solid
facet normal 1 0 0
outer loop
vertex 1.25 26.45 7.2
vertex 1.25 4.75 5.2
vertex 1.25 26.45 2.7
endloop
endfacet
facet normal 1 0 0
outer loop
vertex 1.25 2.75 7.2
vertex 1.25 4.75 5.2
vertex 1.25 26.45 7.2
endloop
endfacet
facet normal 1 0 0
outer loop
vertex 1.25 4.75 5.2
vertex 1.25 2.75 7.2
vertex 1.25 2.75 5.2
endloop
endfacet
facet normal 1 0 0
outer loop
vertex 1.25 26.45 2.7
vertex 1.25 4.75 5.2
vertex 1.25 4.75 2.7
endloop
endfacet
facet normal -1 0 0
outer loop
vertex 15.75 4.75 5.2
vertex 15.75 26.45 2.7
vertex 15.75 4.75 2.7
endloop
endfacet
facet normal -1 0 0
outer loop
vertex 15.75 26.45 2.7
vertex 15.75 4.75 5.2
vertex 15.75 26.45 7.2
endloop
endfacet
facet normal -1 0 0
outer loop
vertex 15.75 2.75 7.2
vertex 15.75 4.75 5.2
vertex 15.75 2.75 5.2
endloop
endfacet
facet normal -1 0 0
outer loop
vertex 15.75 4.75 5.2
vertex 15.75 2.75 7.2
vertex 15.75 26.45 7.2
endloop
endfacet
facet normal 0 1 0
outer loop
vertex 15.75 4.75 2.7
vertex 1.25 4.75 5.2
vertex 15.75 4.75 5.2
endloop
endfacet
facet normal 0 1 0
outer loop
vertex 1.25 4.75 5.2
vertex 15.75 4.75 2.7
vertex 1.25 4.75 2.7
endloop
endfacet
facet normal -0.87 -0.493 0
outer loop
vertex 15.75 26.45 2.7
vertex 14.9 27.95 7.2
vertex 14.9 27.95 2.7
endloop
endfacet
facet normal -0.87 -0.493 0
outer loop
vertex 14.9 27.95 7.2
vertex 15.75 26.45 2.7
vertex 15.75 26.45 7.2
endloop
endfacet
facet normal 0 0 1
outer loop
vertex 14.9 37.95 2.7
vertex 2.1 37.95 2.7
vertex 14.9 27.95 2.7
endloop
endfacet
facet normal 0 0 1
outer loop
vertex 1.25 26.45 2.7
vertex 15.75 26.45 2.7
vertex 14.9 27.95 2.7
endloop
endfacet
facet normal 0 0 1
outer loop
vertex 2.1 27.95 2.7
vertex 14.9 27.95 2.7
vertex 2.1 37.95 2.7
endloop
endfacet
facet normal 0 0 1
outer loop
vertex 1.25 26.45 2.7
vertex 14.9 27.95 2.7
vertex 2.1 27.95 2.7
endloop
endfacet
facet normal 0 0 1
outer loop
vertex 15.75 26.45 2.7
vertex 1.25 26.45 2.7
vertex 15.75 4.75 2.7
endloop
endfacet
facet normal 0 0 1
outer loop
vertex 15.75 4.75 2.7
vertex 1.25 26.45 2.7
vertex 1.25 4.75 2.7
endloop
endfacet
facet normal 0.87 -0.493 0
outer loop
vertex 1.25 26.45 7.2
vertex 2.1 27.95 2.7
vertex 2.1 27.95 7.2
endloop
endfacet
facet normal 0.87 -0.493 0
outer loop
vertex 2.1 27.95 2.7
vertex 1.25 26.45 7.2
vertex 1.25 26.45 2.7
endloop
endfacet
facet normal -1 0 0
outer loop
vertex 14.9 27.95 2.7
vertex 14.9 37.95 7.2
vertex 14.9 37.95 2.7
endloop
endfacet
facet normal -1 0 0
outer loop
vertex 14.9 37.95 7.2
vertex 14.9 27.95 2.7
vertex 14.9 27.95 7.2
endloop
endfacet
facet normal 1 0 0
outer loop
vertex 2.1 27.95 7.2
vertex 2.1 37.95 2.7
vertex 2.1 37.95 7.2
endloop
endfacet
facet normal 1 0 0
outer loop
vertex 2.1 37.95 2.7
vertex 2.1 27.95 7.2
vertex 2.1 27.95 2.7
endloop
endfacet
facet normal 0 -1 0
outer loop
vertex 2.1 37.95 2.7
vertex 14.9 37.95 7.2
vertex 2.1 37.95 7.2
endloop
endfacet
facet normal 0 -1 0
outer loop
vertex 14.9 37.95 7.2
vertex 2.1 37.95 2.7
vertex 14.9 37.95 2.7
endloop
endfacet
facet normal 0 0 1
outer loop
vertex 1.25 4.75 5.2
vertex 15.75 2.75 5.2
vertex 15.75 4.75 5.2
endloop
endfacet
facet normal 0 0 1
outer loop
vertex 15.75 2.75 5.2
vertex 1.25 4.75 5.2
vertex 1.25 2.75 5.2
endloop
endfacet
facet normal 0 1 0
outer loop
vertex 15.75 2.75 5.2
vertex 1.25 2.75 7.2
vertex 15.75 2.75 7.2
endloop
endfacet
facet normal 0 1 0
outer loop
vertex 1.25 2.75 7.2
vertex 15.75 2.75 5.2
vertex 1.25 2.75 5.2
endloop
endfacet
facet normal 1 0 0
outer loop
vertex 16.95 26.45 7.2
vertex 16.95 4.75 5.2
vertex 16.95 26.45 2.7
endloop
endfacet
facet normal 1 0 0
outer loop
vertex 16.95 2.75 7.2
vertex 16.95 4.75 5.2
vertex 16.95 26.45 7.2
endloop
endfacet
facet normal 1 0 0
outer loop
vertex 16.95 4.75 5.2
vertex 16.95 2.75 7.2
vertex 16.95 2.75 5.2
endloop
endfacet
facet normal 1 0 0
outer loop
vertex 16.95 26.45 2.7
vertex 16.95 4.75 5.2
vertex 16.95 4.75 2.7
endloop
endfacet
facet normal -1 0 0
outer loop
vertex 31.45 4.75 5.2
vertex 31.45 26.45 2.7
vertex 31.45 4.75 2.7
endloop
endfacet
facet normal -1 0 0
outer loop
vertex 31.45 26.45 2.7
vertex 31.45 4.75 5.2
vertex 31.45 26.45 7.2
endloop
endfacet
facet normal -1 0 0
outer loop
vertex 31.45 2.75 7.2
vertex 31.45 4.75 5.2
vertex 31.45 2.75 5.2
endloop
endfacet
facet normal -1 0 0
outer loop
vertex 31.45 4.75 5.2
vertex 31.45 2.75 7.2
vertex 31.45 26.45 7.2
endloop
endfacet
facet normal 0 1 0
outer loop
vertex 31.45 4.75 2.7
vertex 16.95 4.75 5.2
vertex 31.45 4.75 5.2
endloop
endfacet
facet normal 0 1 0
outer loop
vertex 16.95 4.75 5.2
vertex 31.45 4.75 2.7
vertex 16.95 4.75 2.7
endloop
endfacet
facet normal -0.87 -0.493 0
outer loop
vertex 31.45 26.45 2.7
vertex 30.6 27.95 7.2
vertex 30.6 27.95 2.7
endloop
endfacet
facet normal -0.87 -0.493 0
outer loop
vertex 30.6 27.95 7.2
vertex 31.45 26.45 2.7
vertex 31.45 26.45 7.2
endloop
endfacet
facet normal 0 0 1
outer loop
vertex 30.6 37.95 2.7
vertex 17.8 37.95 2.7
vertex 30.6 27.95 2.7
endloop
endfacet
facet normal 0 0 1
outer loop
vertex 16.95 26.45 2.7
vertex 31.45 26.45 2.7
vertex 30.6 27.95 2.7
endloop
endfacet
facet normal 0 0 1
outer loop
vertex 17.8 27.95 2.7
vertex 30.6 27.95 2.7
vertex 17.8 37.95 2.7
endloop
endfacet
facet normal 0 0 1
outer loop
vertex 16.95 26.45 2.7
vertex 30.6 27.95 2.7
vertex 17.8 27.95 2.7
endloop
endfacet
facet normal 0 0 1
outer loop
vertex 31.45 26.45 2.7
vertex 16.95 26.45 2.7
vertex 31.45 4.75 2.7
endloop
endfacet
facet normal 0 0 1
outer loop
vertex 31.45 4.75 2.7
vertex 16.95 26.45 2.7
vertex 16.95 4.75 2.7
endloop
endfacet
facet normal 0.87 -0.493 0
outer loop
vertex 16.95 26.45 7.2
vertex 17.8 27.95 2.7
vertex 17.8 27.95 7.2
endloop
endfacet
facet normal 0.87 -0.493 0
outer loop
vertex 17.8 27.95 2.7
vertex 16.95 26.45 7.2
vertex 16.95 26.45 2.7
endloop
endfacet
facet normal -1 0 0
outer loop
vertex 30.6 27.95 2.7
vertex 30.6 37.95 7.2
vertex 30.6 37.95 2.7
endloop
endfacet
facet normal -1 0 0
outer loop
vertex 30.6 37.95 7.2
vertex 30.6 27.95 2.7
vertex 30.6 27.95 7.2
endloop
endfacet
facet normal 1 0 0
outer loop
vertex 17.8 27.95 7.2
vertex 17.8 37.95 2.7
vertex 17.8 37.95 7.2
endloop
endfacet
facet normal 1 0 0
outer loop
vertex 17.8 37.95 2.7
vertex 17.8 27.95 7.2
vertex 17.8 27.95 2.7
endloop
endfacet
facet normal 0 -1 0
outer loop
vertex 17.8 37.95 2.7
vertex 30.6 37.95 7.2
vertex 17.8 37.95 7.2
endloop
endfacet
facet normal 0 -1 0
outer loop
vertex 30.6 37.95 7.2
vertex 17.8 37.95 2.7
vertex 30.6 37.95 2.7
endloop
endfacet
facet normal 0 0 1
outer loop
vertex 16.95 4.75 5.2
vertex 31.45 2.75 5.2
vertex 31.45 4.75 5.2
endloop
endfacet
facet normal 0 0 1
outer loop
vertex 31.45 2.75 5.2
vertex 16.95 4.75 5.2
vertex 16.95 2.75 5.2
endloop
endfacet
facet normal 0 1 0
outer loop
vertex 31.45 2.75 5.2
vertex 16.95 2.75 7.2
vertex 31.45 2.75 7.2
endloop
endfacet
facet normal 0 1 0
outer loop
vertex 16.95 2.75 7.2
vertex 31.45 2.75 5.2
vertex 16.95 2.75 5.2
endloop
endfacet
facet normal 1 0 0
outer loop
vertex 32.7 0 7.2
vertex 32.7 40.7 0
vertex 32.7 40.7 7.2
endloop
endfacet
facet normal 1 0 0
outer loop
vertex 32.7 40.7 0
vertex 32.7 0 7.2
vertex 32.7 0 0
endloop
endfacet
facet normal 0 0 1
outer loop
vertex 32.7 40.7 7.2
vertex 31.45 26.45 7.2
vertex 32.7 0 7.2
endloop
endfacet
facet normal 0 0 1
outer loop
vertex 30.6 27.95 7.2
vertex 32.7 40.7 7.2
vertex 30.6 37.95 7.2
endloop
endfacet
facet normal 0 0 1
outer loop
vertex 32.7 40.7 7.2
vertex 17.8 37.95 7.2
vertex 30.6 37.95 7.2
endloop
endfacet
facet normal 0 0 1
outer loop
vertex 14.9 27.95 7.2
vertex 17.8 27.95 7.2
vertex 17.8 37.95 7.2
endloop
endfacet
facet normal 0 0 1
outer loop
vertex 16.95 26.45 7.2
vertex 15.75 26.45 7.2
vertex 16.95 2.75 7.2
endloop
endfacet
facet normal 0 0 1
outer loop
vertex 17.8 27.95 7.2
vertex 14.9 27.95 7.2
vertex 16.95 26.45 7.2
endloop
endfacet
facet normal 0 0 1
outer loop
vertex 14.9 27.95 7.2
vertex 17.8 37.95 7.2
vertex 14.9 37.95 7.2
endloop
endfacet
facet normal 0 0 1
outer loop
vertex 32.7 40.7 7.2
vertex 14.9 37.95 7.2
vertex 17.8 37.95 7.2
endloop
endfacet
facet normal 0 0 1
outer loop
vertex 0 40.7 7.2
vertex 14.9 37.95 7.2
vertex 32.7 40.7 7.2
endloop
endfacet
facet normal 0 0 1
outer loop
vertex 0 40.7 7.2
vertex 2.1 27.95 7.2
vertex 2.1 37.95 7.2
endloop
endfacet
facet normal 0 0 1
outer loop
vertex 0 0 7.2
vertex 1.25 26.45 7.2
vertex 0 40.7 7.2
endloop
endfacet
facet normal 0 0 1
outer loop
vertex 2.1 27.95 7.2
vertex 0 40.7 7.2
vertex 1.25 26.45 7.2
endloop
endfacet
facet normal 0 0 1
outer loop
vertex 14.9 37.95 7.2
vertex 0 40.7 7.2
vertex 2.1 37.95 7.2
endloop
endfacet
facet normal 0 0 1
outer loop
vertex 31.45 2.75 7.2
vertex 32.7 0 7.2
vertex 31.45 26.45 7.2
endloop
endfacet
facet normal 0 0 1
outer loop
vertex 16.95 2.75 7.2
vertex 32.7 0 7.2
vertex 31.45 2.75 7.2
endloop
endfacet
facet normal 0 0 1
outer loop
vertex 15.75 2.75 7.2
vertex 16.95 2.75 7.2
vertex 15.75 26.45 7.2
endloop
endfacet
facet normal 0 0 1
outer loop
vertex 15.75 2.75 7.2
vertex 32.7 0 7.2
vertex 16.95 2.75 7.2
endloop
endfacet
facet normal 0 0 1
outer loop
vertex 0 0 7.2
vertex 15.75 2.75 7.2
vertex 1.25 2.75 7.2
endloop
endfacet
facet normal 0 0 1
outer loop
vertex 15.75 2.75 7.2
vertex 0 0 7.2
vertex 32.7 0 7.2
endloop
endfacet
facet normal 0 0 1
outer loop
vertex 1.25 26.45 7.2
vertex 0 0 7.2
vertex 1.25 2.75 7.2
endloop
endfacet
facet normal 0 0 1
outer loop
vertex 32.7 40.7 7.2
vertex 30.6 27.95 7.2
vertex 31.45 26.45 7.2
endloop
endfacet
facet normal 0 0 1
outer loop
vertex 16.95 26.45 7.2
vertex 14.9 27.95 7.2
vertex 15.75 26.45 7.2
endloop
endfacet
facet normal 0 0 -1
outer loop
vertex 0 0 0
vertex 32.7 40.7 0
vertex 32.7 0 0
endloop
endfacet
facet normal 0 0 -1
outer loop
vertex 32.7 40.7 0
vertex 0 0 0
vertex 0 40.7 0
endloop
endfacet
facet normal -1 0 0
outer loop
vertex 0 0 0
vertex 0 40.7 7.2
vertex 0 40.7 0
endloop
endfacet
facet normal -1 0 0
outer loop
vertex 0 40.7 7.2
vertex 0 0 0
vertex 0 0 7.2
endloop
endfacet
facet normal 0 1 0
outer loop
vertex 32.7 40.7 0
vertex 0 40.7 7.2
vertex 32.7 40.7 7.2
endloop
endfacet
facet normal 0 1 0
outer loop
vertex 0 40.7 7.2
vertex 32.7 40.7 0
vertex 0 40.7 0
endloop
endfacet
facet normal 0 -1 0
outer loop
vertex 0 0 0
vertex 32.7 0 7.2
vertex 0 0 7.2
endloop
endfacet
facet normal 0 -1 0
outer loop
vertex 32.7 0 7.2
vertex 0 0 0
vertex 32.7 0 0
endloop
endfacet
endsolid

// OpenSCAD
/* [Case] */

//Case outer width
case_width = 34.5;

//Case outer lenth
case_lenth = 42.5;

//Case outer height
case_height = 9;

//Case thickness
case_thickness = 0.9;

//Space between the USB keys
spacing_x = 1.2;

/* [USB] */

//USB total lenth
USB_lenth = 33.2;

//USB back part width
USB_back_width = 14.5;

/* [Hidden] */
USB_front_width = 12+0.8;
USB_front_lenth = 10;
USB_height = 4.5;
lever_height = 2;
lever_depth = 2;
inside_width = case_width - (case_thickness * 2);
inside_lenth = case_lenth - (case_thickness * 2);
inside_height = case_height - (case_thickness * 2);
spacing_y = (inside_lenth-USB_lenth+lever_depth)/2;
USB_slots = floor(inside_width/(USB_back_width+spacing_x));
side_spacing = (inside_width-(spacing_x+(USB_back_width+spacing_x)*USB_slots))/2;
USB_back_lenth = USB_lenth-USB_front_lenth-1.5;

module case() {
    cube([inside_width, inside_lenth, inside_height]);
}

module USB() {
	hull() {
		cube([USB_back_width, USB_back_lenth, USB_height]);	
		translate([((USB_back_width-USB_front_width)/2),USB_back_lenth,0]) {
			cube([USB_front_width, 1.5, USB_height]);
		}
	}
	translate([((USB_back_width-USB_front_width)/2),USB_back_lenth+1.5,0]) {
			cube([USB_front_width, USB_front_lenth, USB_height]);
	}
	translate([0, -lever_depth, USB_height-lever_height]) {
		cube([USB_back_width, lever_depth, lever_height]);
	}
}

if (side_spacing < 0) {
	USB_slots = USB_slots-1;
	side_spacing = (inside_width-(spacing_x+(USB_back_width+spacing_x)*USB_slots))/2;
	difference() {
		case();
		for (x = [0:USB_slots-1]) {
			translate([(spacing_x+side_spacing+(USB_back_width+spacing_x)*x),spacing_y,(inside_height-USB_height)]) {
					USB();
			}
		}
	}
}
else {
	difference() {
		case();
		for (x = [0:USB_slots-1]) {
			translate([(spacing_x+side_spacing+(USB_back_width+spacing_x)*x),spacing_y,(inside_height-USB_height)]) {
				USB();
			}
		}
	}
}
